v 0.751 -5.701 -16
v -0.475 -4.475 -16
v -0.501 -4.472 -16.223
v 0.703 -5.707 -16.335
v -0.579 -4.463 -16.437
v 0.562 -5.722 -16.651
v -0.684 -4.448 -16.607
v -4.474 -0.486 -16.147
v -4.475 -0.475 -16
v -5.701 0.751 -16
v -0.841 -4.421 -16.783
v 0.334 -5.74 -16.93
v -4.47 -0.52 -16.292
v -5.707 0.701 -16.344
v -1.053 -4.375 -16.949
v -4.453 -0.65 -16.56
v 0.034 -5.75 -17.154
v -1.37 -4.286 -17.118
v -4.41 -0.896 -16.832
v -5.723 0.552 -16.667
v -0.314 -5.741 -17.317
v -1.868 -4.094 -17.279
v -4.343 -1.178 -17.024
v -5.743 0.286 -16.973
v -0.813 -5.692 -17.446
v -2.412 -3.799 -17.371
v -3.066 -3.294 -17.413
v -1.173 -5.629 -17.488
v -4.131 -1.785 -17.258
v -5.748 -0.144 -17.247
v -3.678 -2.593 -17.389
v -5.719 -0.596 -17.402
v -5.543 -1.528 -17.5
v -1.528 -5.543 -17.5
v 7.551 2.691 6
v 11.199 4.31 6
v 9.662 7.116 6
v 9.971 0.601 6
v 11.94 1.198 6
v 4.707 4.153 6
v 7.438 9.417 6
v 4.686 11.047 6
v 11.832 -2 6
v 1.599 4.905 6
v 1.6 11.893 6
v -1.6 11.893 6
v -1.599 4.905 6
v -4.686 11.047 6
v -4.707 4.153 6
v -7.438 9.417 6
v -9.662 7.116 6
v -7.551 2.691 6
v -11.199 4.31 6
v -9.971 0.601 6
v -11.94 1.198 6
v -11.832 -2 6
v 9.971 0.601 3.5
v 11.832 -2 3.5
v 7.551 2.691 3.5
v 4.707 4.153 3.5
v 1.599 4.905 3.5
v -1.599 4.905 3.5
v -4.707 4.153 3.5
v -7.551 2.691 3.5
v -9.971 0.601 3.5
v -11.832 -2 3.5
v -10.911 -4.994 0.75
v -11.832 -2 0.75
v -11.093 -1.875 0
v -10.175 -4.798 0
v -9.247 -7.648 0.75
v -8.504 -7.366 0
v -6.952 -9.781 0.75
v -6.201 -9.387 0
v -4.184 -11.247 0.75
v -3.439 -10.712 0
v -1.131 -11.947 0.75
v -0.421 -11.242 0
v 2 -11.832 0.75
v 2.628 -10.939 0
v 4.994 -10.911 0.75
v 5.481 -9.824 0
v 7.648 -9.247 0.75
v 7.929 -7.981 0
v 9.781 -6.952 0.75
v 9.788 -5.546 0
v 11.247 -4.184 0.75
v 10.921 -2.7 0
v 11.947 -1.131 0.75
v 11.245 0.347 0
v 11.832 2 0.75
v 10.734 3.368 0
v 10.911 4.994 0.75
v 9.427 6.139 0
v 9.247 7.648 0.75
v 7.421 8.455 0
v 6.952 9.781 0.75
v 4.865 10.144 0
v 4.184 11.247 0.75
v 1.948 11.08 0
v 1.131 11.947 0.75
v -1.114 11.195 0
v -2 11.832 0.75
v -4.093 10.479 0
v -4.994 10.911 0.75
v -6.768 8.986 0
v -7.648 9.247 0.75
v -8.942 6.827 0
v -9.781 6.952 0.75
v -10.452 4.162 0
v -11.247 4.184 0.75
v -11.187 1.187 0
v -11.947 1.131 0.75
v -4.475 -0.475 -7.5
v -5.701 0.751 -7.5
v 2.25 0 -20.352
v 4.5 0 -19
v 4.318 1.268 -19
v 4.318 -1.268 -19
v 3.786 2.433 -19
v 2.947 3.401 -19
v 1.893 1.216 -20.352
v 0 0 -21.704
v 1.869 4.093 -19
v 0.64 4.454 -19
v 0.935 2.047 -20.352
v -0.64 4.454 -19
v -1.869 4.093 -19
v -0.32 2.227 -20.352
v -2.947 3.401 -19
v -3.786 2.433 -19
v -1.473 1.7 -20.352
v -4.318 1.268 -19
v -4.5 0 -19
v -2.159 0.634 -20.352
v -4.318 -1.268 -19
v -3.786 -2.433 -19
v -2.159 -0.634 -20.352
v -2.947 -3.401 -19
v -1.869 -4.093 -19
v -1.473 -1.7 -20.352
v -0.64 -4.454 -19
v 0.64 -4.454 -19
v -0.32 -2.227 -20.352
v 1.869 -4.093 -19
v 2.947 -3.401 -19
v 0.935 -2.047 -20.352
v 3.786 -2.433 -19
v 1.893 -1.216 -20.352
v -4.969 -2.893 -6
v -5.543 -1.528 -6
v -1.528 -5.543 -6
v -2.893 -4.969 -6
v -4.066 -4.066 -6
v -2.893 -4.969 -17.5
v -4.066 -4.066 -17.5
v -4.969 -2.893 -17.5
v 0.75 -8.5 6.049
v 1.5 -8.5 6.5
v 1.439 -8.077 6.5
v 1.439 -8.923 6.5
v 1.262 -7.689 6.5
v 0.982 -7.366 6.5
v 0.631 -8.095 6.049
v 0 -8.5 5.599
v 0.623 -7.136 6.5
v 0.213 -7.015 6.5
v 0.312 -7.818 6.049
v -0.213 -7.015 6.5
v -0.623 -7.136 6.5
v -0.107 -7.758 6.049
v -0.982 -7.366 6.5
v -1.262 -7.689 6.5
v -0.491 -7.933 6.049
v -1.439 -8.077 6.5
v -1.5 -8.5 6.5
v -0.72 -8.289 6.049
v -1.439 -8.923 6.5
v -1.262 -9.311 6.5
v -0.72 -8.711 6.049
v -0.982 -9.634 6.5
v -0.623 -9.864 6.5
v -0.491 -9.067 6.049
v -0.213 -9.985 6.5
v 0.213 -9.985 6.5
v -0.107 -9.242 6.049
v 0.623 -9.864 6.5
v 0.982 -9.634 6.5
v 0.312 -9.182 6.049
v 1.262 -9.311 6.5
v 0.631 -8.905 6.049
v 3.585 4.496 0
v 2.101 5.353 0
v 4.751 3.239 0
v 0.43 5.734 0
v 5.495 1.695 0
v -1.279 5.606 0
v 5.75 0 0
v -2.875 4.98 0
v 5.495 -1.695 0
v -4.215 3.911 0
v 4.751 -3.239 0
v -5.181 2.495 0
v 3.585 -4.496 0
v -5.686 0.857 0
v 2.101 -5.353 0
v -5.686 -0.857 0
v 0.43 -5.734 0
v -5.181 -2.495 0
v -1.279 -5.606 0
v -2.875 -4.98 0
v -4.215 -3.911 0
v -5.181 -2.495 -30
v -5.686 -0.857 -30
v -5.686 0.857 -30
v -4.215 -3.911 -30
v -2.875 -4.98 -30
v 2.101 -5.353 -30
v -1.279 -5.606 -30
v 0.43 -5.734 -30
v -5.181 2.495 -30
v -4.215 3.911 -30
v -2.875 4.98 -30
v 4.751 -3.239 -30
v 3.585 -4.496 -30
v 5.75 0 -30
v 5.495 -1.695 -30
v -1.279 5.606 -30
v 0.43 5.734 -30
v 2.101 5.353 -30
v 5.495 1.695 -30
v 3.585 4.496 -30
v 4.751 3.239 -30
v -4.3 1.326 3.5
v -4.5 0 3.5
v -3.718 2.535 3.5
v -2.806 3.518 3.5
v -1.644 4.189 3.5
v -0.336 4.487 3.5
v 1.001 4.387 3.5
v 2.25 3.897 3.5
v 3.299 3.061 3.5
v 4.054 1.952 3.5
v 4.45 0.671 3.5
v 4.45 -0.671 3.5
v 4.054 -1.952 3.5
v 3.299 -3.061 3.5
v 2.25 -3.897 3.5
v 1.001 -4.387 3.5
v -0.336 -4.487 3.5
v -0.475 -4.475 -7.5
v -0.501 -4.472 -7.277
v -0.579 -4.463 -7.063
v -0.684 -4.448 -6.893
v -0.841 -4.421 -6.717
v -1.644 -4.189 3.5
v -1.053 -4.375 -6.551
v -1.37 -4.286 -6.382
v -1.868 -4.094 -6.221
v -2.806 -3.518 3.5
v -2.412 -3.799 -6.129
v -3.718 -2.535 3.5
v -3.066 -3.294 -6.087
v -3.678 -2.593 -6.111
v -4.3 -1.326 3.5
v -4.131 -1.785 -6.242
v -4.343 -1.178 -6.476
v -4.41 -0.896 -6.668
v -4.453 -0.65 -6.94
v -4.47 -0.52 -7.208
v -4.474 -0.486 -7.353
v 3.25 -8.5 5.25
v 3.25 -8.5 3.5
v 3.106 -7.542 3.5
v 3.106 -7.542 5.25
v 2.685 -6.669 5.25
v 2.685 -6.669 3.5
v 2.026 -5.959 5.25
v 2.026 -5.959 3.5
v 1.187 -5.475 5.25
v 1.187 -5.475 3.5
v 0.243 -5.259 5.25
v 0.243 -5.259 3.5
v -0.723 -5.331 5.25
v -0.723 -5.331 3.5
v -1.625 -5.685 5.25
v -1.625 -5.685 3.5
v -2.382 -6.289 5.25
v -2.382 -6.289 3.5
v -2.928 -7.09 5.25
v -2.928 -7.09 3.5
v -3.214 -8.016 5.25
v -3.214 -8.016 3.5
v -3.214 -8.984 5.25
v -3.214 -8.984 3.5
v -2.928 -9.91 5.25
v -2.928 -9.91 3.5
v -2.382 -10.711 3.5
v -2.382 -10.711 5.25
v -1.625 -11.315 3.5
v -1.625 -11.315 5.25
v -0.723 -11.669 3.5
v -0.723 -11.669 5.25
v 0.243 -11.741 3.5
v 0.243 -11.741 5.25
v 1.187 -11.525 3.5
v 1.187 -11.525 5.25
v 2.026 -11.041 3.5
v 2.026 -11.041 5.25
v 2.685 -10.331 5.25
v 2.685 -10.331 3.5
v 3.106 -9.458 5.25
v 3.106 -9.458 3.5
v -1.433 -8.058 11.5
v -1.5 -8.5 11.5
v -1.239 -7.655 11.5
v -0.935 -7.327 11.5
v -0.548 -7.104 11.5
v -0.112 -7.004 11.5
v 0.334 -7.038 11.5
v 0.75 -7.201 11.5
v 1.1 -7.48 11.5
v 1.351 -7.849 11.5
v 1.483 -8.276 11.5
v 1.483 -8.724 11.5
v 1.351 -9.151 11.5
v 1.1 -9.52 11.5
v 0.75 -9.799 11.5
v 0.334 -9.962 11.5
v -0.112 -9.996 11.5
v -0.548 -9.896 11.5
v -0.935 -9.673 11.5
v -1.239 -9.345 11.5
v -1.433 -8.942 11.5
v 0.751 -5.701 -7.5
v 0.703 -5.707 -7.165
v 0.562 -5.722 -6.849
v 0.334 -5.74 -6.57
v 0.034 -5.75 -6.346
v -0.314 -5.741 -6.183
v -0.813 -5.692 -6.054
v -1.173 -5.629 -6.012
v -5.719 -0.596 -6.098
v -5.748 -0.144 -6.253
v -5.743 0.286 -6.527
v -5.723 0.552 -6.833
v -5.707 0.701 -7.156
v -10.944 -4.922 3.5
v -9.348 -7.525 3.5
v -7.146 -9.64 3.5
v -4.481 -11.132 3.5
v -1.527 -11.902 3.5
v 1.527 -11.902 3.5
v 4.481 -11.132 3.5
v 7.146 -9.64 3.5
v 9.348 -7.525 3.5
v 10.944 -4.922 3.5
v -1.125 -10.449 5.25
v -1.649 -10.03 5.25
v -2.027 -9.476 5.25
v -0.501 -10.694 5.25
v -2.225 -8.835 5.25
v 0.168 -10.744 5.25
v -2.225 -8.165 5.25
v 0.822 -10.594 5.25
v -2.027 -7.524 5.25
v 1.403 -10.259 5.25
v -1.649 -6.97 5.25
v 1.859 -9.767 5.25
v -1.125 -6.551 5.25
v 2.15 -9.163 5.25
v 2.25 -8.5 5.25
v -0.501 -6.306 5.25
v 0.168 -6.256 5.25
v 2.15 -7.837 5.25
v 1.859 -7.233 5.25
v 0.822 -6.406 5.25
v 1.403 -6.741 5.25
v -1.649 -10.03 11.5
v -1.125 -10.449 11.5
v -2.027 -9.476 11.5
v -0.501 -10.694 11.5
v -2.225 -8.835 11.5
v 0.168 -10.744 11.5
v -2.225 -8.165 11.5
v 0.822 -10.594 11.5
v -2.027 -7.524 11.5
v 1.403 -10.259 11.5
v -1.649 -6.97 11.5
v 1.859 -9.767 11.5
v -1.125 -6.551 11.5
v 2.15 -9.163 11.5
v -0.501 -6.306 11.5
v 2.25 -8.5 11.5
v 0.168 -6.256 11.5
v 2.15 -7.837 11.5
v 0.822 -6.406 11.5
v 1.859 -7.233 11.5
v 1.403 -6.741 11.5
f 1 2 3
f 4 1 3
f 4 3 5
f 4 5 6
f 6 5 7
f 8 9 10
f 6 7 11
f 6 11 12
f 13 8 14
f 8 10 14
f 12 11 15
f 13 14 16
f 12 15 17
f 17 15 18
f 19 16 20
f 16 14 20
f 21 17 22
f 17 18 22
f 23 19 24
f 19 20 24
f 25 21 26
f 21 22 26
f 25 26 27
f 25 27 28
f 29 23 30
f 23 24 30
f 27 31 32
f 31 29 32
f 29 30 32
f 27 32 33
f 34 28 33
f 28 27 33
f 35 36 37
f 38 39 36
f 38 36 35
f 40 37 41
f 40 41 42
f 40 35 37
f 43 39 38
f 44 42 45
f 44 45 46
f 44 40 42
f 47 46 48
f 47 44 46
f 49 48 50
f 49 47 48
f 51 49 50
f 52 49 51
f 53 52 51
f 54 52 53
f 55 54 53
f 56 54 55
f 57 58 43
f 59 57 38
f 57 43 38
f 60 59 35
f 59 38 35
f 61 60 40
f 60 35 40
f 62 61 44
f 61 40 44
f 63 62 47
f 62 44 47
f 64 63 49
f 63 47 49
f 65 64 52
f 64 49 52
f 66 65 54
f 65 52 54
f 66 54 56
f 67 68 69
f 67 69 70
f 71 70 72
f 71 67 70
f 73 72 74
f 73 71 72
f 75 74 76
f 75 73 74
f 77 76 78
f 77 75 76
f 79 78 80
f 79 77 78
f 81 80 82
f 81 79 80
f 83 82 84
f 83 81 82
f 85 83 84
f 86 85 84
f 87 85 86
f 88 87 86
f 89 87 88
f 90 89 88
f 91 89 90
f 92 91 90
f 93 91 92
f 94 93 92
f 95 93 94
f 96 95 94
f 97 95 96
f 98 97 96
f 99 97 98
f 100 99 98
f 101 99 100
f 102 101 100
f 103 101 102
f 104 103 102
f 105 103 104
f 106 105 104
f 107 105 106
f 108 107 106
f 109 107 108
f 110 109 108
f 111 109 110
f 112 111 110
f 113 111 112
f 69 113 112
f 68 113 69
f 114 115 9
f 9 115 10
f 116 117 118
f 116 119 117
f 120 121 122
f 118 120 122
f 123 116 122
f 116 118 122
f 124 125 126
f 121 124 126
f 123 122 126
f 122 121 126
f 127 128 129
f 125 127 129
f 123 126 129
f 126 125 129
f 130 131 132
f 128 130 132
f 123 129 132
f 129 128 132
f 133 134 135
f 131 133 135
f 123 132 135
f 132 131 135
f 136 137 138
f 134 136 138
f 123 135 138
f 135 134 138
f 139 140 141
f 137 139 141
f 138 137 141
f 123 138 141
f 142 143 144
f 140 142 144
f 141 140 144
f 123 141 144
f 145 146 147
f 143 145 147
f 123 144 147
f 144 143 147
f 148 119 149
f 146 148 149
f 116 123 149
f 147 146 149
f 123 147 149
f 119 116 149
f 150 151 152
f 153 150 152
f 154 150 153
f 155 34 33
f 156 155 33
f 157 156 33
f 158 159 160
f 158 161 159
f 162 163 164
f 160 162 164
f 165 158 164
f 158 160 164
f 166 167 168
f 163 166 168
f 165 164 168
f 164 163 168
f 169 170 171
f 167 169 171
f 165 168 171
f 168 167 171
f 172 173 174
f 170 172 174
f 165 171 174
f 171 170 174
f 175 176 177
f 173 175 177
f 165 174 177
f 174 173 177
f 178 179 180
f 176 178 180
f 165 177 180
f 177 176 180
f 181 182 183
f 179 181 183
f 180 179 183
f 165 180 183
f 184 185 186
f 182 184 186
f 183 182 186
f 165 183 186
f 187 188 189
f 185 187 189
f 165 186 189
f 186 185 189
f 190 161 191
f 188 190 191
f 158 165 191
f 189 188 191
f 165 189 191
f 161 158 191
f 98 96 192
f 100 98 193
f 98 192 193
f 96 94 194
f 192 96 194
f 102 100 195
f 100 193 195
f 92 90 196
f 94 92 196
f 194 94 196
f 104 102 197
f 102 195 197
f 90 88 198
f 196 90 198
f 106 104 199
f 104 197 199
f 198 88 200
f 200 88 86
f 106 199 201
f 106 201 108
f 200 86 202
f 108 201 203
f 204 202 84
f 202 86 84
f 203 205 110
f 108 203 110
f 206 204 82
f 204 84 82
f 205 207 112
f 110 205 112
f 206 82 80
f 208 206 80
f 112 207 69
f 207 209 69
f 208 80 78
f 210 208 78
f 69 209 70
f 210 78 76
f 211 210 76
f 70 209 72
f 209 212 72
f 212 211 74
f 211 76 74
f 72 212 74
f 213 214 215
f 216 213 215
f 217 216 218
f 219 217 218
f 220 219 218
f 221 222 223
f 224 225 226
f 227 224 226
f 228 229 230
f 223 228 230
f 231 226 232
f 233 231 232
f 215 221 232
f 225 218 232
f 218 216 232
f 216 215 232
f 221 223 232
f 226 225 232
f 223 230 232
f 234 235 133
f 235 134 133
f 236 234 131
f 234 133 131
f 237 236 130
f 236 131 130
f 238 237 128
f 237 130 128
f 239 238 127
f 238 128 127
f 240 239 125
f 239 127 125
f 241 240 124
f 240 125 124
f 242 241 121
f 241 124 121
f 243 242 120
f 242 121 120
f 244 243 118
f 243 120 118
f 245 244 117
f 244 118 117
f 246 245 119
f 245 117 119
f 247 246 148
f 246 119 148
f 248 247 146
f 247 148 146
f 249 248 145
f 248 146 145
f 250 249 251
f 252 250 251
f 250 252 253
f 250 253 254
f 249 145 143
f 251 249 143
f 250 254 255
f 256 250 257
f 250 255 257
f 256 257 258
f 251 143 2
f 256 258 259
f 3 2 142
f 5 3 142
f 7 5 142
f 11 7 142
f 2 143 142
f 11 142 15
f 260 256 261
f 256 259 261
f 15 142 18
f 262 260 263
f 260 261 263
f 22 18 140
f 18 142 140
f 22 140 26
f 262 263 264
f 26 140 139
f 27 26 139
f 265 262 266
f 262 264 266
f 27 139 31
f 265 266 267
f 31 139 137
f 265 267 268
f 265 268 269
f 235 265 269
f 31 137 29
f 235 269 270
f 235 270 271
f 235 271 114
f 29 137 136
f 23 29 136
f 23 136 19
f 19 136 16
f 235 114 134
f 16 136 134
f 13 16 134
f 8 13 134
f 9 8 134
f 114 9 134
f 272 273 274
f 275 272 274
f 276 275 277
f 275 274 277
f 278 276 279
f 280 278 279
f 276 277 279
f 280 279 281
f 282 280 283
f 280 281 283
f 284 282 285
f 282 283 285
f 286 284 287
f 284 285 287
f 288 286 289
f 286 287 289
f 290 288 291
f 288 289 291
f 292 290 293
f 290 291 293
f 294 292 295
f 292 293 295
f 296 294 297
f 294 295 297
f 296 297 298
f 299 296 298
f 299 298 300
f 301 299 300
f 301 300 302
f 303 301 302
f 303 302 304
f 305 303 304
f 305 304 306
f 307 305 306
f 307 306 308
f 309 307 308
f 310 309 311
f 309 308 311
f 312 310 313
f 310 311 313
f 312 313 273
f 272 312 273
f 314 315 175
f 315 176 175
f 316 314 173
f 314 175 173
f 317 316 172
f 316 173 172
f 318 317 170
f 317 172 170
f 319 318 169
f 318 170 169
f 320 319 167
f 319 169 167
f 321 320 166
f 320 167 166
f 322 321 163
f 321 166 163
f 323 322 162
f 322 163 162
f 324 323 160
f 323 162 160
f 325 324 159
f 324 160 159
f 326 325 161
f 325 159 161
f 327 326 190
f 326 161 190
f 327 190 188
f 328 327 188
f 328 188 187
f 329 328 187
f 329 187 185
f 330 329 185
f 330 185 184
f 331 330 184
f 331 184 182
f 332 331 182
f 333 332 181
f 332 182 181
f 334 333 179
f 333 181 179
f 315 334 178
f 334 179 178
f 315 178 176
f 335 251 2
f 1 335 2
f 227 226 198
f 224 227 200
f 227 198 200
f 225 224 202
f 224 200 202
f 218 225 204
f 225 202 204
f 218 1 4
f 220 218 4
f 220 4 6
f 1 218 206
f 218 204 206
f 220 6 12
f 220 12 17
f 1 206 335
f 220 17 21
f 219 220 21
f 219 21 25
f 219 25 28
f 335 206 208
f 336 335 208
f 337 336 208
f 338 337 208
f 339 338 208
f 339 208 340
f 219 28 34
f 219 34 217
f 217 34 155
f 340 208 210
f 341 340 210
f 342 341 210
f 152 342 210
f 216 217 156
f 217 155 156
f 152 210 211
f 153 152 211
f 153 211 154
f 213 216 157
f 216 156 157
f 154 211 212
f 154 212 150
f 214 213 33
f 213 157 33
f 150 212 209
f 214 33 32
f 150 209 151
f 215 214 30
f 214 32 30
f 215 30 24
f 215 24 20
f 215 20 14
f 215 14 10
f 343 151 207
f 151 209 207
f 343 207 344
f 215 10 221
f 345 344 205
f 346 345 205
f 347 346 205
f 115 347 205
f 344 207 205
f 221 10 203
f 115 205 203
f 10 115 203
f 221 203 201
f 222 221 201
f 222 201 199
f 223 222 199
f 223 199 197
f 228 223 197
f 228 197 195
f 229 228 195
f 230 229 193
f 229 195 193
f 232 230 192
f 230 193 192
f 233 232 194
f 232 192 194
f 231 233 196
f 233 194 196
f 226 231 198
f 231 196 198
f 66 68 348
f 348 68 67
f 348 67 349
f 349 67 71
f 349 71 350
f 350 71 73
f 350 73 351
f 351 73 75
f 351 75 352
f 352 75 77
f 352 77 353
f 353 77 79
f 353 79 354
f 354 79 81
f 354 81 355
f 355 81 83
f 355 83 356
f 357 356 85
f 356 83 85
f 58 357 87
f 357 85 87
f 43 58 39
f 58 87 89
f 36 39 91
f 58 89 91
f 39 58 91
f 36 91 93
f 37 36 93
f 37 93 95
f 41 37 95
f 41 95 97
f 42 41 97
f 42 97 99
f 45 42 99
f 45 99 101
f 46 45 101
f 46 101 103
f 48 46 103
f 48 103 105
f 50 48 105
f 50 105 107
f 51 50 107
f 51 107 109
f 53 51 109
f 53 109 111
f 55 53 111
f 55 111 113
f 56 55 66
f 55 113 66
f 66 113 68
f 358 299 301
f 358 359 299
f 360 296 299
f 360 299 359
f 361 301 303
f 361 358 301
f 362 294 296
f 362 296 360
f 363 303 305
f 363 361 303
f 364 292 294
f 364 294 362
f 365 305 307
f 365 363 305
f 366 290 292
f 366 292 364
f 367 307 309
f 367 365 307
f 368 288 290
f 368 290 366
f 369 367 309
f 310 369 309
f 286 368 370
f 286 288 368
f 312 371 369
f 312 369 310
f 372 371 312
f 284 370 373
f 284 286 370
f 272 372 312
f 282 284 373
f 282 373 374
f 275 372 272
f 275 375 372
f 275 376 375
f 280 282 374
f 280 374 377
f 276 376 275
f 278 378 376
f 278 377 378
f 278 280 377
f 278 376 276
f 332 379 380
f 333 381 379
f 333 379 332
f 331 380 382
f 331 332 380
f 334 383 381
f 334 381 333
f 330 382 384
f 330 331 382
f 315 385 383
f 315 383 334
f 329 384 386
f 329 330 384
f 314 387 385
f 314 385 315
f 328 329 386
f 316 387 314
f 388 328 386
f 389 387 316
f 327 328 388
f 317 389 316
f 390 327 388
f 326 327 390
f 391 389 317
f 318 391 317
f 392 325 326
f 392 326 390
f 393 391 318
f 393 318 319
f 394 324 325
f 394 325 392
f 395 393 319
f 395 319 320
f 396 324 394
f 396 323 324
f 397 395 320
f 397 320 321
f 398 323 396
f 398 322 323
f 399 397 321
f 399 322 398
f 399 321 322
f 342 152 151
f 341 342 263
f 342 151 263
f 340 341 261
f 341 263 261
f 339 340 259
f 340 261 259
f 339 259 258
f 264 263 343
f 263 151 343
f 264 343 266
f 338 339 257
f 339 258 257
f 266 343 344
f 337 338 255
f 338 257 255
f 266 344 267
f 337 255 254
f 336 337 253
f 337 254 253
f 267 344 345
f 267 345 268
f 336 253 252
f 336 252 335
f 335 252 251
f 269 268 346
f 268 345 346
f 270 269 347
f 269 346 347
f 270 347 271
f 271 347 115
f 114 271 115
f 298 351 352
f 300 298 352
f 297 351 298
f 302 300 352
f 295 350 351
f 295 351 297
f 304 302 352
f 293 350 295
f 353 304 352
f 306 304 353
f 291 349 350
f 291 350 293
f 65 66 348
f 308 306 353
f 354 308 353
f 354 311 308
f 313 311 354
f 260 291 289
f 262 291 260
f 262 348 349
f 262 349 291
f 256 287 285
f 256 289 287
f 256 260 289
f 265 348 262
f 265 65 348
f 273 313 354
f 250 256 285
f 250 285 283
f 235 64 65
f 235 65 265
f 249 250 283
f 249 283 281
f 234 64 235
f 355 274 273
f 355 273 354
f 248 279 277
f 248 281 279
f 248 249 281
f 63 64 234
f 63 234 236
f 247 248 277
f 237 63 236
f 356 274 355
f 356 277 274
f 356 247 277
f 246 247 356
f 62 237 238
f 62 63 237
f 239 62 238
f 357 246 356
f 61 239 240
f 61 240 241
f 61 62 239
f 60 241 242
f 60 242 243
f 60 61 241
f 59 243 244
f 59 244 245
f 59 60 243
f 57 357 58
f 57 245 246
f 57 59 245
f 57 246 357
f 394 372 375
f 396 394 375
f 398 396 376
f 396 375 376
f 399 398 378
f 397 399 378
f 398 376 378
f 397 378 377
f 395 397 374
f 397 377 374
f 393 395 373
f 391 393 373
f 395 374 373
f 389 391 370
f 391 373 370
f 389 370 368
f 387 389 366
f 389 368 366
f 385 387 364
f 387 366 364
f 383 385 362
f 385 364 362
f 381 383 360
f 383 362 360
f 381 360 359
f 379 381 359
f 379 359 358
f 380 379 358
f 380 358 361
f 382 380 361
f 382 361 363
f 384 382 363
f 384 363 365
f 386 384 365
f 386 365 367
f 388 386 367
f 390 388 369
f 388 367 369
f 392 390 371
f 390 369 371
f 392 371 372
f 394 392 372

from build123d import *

# Parameters (mm, degrees)
ESQUISSE1_R                  = 12
BASE_EXTRUSION_DEPTH         = 6
ESQUISSE2_R                  = 5.75
BOSS_EXTRU_1_DEPTH           = 33
ESQUISSE3_R                  = 5.75
BOSS_EXTRU_2_DEPTH           = 6
BOSS_EXTRU_2_TAPER           = 10
BOSS_EXTRU_3_START           = -50.5
ESQUISSE4_R                  = 4
BOSS_EXTRU_3_DEPTH           = 5.5
ESQUISSE5_R                  = 13.5
ENL_V_MAT_EXTRU_1_DEPTH      = 2.5
ESQUISSE7_R                  = 3.25
BOSS_EXTRU_7_DEPTH           = 1.75
ESQUISSE8_R                  = 2.25
BOSS_EXTRU_8_DEPTH           = 6.25
PER_AGE1_D                   = 3
PER_AGE1_DEPTH               = 5
PER_AGE1_TIP                 = 0.901290929
ENL_V_MAT_EXTRU_2_DEPTH      = 43.532340728
ENL_V_MAT_EXTRU_2_DEPTH_BACK = 43.532340728
PER_AGE3_D                   = 9
PER_AGE3_DEPTH               = 22.5
PER_AGE3_TIP                 = 2.703872786
CHANFREIN1_SIZE              = 0.75
ESQUISSE22_W                 = 54.648205004
ESQUISSE22_H                 = 36.718532871
ENL_V_MAT_EXTRU_5_DEPTH      = 45.83581158


with BuildPart() as part:
    # Esquisse1 → Base-Extrusion (new body)
    with BuildSketch(Plane.XY):
        with Locations(Location((0, 0, 0), (0, 0, 189.594068227))):
            Circle(ESQUISSE1_R)
    extrude(amount=BASE_EXTRUSION_DEPTH)

    # Esquisse2 → Boss.-Extru.1 (add)
    with BuildSketch(Plane(origin=(0, 0, 0), x_dir=(-1, 0, 0), z_dir=(0, 0, -1))):
        with Locations(Location((0, 0, 0), (0, 0, 180))):
            Circle(ESQUISSE2_R)
    extrude(amount=BOSS_EXTRU_1_DEPTH)

    # Esquisse3 → Boss.-Extru.2 (add)
    with BuildSketch(Plane(origin=(0, 0, -33), x_dir=(-1, 0, 0), z_dir=(0, 0, -1))):
        with Locations(Location((0, 0, 0), (0, 0, 180))):
            Circle(ESQUISSE3_R)
    extrude(amount=BOSS_EXTRU_2_DEPTH, taper=BOSS_EXTRU_2_TAPER)

    # Esquisse4 → Boss.-Extru.3 (add)
    with BuildSketch(Plane(origin=(0, 0, -39), x_dir=(-1, 0, 0), z_dir=(0, 0, -1)).offset(BOSS_EXTRU_3_START)):
        Circle(ESQUISSE4_R)
    extrude(amount=BOSS_EXTRU_3_DEPTH)

    # Esquisse5 → Enlèv. mat.-Extru.1 (cut)
    with BuildSketch(Plane.XY.offset(6)):
        with Locations((0, -8.5)):
            Circle(ESQUISSE5_R)
    extrude(amount=-ENL_V_MAT_EXTRU_1_DEPTH, mode=Mode.SUBTRACT)

    # Esquisse7 → Boss.-Extru.7 (add)
    with BuildSketch(Plane.XY.offset(3.5)):
        with Locations((0, -8.5)):
            Circle(ESQUISSE7_R)
    extrude(amount=BOSS_EXTRU_7_DEPTH)

    # Esquisse8 → Boss.-Extru.8 (add)
    with BuildSketch(Plane.XY.offset(5.25)):
        with Locations((0, -8.5)):
            Circle(ESQUISSE8_R)
    extrude(amount=BOSS_EXTRU_8_DEPTH)

    # Perçage1
    with Locations(Plane.XY.offset(11.5)):
        with Locations((0, -8.5)):
            Hole(PER_AGE1_D / 2, depth=PER_AGE1_DEPTH)
            with Locations((0, 0, -(PER_AGE1_DEPTH + PER_AGE1_TIP / 2))):  # 118° drill point
                Cone(0, PER_AGE1_D / 2, PER_AGE1_TIP, mode=Mode.SUBTRACT)

    # Esquisse19 → Enlèv. mat.-Extru.2 (cut, two sides: drawn at the far end of the back side and taken through both)
    with BuildSketch(Plane(origin=(0, 0, 0), x_dir=(0.7071067811865488, 0.7071067811865462, 0), z_dir=(0.7071067811865462, -0.7071067811865488, 0)).offset(-ENL_V_MAT_EXTRU_2_DEPTH_BACK)):
        with BuildLine():
            Line((-5.75, -6), (-5, -6))
            ThreePointArc((-5, -6), (-3.939339828, -6.439339828), (-3.5, -7.5))
            Line((-3.5, -7.5), (-3.5, -16))
            ThreePointArc((-3.5, -16), (-3.939339828, -17.060660172), (-5, -17.5))
            Line((-5, -17.5), (-5.75, -17.5))
            Line((-5.75, -17.5), (-5.75, -6))
        make_face()
    extrude(amount=ENL_V_MAT_EXTRU_2_DEPTH + ENL_V_MAT_EXTRU_2_DEPTH_BACK, mode=Mode.SUBTRACT)

    # Perçage3
    with Locations(Plane.XY.offset(3.5)):
        with Locations((0, 0)):
            Hole(PER_AGE3_D / 2, depth=PER_AGE3_DEPTH)
            with Locations((0, 0, -(PER_AGE3_DEPTH + PER_AGE3_TIP / 2))):  # 118° drill point
                Cone(0, PER_AGE3_D / 2, PER_AGE3_TIP, mode=Mode.SUBTRACT)

    # Chanfrein1
    chanfrein1_edges = [part.edges().sort_by_distance(p)[0] for p in [
        (11.832159566, 2, 0),
    ]]
    chamfer(chanfrein1_edges, length=CHANFREIN1_SIZE)

    # Esquisse22 → Enlèv. mat.-Extru.5 (cut, through all)
    with BuildSketch(Plane.XY.offset(-30)):
        with Locations((3.376157781, -1.667455282)):
            Rectangle(ESQUISSE22_W, ESQUISSE22_H)
    extrude(amount=-ENL_V_MAT_EXTRU_5_DEPTH, mode=Mode.SUBTRACT)


solid = part.part
